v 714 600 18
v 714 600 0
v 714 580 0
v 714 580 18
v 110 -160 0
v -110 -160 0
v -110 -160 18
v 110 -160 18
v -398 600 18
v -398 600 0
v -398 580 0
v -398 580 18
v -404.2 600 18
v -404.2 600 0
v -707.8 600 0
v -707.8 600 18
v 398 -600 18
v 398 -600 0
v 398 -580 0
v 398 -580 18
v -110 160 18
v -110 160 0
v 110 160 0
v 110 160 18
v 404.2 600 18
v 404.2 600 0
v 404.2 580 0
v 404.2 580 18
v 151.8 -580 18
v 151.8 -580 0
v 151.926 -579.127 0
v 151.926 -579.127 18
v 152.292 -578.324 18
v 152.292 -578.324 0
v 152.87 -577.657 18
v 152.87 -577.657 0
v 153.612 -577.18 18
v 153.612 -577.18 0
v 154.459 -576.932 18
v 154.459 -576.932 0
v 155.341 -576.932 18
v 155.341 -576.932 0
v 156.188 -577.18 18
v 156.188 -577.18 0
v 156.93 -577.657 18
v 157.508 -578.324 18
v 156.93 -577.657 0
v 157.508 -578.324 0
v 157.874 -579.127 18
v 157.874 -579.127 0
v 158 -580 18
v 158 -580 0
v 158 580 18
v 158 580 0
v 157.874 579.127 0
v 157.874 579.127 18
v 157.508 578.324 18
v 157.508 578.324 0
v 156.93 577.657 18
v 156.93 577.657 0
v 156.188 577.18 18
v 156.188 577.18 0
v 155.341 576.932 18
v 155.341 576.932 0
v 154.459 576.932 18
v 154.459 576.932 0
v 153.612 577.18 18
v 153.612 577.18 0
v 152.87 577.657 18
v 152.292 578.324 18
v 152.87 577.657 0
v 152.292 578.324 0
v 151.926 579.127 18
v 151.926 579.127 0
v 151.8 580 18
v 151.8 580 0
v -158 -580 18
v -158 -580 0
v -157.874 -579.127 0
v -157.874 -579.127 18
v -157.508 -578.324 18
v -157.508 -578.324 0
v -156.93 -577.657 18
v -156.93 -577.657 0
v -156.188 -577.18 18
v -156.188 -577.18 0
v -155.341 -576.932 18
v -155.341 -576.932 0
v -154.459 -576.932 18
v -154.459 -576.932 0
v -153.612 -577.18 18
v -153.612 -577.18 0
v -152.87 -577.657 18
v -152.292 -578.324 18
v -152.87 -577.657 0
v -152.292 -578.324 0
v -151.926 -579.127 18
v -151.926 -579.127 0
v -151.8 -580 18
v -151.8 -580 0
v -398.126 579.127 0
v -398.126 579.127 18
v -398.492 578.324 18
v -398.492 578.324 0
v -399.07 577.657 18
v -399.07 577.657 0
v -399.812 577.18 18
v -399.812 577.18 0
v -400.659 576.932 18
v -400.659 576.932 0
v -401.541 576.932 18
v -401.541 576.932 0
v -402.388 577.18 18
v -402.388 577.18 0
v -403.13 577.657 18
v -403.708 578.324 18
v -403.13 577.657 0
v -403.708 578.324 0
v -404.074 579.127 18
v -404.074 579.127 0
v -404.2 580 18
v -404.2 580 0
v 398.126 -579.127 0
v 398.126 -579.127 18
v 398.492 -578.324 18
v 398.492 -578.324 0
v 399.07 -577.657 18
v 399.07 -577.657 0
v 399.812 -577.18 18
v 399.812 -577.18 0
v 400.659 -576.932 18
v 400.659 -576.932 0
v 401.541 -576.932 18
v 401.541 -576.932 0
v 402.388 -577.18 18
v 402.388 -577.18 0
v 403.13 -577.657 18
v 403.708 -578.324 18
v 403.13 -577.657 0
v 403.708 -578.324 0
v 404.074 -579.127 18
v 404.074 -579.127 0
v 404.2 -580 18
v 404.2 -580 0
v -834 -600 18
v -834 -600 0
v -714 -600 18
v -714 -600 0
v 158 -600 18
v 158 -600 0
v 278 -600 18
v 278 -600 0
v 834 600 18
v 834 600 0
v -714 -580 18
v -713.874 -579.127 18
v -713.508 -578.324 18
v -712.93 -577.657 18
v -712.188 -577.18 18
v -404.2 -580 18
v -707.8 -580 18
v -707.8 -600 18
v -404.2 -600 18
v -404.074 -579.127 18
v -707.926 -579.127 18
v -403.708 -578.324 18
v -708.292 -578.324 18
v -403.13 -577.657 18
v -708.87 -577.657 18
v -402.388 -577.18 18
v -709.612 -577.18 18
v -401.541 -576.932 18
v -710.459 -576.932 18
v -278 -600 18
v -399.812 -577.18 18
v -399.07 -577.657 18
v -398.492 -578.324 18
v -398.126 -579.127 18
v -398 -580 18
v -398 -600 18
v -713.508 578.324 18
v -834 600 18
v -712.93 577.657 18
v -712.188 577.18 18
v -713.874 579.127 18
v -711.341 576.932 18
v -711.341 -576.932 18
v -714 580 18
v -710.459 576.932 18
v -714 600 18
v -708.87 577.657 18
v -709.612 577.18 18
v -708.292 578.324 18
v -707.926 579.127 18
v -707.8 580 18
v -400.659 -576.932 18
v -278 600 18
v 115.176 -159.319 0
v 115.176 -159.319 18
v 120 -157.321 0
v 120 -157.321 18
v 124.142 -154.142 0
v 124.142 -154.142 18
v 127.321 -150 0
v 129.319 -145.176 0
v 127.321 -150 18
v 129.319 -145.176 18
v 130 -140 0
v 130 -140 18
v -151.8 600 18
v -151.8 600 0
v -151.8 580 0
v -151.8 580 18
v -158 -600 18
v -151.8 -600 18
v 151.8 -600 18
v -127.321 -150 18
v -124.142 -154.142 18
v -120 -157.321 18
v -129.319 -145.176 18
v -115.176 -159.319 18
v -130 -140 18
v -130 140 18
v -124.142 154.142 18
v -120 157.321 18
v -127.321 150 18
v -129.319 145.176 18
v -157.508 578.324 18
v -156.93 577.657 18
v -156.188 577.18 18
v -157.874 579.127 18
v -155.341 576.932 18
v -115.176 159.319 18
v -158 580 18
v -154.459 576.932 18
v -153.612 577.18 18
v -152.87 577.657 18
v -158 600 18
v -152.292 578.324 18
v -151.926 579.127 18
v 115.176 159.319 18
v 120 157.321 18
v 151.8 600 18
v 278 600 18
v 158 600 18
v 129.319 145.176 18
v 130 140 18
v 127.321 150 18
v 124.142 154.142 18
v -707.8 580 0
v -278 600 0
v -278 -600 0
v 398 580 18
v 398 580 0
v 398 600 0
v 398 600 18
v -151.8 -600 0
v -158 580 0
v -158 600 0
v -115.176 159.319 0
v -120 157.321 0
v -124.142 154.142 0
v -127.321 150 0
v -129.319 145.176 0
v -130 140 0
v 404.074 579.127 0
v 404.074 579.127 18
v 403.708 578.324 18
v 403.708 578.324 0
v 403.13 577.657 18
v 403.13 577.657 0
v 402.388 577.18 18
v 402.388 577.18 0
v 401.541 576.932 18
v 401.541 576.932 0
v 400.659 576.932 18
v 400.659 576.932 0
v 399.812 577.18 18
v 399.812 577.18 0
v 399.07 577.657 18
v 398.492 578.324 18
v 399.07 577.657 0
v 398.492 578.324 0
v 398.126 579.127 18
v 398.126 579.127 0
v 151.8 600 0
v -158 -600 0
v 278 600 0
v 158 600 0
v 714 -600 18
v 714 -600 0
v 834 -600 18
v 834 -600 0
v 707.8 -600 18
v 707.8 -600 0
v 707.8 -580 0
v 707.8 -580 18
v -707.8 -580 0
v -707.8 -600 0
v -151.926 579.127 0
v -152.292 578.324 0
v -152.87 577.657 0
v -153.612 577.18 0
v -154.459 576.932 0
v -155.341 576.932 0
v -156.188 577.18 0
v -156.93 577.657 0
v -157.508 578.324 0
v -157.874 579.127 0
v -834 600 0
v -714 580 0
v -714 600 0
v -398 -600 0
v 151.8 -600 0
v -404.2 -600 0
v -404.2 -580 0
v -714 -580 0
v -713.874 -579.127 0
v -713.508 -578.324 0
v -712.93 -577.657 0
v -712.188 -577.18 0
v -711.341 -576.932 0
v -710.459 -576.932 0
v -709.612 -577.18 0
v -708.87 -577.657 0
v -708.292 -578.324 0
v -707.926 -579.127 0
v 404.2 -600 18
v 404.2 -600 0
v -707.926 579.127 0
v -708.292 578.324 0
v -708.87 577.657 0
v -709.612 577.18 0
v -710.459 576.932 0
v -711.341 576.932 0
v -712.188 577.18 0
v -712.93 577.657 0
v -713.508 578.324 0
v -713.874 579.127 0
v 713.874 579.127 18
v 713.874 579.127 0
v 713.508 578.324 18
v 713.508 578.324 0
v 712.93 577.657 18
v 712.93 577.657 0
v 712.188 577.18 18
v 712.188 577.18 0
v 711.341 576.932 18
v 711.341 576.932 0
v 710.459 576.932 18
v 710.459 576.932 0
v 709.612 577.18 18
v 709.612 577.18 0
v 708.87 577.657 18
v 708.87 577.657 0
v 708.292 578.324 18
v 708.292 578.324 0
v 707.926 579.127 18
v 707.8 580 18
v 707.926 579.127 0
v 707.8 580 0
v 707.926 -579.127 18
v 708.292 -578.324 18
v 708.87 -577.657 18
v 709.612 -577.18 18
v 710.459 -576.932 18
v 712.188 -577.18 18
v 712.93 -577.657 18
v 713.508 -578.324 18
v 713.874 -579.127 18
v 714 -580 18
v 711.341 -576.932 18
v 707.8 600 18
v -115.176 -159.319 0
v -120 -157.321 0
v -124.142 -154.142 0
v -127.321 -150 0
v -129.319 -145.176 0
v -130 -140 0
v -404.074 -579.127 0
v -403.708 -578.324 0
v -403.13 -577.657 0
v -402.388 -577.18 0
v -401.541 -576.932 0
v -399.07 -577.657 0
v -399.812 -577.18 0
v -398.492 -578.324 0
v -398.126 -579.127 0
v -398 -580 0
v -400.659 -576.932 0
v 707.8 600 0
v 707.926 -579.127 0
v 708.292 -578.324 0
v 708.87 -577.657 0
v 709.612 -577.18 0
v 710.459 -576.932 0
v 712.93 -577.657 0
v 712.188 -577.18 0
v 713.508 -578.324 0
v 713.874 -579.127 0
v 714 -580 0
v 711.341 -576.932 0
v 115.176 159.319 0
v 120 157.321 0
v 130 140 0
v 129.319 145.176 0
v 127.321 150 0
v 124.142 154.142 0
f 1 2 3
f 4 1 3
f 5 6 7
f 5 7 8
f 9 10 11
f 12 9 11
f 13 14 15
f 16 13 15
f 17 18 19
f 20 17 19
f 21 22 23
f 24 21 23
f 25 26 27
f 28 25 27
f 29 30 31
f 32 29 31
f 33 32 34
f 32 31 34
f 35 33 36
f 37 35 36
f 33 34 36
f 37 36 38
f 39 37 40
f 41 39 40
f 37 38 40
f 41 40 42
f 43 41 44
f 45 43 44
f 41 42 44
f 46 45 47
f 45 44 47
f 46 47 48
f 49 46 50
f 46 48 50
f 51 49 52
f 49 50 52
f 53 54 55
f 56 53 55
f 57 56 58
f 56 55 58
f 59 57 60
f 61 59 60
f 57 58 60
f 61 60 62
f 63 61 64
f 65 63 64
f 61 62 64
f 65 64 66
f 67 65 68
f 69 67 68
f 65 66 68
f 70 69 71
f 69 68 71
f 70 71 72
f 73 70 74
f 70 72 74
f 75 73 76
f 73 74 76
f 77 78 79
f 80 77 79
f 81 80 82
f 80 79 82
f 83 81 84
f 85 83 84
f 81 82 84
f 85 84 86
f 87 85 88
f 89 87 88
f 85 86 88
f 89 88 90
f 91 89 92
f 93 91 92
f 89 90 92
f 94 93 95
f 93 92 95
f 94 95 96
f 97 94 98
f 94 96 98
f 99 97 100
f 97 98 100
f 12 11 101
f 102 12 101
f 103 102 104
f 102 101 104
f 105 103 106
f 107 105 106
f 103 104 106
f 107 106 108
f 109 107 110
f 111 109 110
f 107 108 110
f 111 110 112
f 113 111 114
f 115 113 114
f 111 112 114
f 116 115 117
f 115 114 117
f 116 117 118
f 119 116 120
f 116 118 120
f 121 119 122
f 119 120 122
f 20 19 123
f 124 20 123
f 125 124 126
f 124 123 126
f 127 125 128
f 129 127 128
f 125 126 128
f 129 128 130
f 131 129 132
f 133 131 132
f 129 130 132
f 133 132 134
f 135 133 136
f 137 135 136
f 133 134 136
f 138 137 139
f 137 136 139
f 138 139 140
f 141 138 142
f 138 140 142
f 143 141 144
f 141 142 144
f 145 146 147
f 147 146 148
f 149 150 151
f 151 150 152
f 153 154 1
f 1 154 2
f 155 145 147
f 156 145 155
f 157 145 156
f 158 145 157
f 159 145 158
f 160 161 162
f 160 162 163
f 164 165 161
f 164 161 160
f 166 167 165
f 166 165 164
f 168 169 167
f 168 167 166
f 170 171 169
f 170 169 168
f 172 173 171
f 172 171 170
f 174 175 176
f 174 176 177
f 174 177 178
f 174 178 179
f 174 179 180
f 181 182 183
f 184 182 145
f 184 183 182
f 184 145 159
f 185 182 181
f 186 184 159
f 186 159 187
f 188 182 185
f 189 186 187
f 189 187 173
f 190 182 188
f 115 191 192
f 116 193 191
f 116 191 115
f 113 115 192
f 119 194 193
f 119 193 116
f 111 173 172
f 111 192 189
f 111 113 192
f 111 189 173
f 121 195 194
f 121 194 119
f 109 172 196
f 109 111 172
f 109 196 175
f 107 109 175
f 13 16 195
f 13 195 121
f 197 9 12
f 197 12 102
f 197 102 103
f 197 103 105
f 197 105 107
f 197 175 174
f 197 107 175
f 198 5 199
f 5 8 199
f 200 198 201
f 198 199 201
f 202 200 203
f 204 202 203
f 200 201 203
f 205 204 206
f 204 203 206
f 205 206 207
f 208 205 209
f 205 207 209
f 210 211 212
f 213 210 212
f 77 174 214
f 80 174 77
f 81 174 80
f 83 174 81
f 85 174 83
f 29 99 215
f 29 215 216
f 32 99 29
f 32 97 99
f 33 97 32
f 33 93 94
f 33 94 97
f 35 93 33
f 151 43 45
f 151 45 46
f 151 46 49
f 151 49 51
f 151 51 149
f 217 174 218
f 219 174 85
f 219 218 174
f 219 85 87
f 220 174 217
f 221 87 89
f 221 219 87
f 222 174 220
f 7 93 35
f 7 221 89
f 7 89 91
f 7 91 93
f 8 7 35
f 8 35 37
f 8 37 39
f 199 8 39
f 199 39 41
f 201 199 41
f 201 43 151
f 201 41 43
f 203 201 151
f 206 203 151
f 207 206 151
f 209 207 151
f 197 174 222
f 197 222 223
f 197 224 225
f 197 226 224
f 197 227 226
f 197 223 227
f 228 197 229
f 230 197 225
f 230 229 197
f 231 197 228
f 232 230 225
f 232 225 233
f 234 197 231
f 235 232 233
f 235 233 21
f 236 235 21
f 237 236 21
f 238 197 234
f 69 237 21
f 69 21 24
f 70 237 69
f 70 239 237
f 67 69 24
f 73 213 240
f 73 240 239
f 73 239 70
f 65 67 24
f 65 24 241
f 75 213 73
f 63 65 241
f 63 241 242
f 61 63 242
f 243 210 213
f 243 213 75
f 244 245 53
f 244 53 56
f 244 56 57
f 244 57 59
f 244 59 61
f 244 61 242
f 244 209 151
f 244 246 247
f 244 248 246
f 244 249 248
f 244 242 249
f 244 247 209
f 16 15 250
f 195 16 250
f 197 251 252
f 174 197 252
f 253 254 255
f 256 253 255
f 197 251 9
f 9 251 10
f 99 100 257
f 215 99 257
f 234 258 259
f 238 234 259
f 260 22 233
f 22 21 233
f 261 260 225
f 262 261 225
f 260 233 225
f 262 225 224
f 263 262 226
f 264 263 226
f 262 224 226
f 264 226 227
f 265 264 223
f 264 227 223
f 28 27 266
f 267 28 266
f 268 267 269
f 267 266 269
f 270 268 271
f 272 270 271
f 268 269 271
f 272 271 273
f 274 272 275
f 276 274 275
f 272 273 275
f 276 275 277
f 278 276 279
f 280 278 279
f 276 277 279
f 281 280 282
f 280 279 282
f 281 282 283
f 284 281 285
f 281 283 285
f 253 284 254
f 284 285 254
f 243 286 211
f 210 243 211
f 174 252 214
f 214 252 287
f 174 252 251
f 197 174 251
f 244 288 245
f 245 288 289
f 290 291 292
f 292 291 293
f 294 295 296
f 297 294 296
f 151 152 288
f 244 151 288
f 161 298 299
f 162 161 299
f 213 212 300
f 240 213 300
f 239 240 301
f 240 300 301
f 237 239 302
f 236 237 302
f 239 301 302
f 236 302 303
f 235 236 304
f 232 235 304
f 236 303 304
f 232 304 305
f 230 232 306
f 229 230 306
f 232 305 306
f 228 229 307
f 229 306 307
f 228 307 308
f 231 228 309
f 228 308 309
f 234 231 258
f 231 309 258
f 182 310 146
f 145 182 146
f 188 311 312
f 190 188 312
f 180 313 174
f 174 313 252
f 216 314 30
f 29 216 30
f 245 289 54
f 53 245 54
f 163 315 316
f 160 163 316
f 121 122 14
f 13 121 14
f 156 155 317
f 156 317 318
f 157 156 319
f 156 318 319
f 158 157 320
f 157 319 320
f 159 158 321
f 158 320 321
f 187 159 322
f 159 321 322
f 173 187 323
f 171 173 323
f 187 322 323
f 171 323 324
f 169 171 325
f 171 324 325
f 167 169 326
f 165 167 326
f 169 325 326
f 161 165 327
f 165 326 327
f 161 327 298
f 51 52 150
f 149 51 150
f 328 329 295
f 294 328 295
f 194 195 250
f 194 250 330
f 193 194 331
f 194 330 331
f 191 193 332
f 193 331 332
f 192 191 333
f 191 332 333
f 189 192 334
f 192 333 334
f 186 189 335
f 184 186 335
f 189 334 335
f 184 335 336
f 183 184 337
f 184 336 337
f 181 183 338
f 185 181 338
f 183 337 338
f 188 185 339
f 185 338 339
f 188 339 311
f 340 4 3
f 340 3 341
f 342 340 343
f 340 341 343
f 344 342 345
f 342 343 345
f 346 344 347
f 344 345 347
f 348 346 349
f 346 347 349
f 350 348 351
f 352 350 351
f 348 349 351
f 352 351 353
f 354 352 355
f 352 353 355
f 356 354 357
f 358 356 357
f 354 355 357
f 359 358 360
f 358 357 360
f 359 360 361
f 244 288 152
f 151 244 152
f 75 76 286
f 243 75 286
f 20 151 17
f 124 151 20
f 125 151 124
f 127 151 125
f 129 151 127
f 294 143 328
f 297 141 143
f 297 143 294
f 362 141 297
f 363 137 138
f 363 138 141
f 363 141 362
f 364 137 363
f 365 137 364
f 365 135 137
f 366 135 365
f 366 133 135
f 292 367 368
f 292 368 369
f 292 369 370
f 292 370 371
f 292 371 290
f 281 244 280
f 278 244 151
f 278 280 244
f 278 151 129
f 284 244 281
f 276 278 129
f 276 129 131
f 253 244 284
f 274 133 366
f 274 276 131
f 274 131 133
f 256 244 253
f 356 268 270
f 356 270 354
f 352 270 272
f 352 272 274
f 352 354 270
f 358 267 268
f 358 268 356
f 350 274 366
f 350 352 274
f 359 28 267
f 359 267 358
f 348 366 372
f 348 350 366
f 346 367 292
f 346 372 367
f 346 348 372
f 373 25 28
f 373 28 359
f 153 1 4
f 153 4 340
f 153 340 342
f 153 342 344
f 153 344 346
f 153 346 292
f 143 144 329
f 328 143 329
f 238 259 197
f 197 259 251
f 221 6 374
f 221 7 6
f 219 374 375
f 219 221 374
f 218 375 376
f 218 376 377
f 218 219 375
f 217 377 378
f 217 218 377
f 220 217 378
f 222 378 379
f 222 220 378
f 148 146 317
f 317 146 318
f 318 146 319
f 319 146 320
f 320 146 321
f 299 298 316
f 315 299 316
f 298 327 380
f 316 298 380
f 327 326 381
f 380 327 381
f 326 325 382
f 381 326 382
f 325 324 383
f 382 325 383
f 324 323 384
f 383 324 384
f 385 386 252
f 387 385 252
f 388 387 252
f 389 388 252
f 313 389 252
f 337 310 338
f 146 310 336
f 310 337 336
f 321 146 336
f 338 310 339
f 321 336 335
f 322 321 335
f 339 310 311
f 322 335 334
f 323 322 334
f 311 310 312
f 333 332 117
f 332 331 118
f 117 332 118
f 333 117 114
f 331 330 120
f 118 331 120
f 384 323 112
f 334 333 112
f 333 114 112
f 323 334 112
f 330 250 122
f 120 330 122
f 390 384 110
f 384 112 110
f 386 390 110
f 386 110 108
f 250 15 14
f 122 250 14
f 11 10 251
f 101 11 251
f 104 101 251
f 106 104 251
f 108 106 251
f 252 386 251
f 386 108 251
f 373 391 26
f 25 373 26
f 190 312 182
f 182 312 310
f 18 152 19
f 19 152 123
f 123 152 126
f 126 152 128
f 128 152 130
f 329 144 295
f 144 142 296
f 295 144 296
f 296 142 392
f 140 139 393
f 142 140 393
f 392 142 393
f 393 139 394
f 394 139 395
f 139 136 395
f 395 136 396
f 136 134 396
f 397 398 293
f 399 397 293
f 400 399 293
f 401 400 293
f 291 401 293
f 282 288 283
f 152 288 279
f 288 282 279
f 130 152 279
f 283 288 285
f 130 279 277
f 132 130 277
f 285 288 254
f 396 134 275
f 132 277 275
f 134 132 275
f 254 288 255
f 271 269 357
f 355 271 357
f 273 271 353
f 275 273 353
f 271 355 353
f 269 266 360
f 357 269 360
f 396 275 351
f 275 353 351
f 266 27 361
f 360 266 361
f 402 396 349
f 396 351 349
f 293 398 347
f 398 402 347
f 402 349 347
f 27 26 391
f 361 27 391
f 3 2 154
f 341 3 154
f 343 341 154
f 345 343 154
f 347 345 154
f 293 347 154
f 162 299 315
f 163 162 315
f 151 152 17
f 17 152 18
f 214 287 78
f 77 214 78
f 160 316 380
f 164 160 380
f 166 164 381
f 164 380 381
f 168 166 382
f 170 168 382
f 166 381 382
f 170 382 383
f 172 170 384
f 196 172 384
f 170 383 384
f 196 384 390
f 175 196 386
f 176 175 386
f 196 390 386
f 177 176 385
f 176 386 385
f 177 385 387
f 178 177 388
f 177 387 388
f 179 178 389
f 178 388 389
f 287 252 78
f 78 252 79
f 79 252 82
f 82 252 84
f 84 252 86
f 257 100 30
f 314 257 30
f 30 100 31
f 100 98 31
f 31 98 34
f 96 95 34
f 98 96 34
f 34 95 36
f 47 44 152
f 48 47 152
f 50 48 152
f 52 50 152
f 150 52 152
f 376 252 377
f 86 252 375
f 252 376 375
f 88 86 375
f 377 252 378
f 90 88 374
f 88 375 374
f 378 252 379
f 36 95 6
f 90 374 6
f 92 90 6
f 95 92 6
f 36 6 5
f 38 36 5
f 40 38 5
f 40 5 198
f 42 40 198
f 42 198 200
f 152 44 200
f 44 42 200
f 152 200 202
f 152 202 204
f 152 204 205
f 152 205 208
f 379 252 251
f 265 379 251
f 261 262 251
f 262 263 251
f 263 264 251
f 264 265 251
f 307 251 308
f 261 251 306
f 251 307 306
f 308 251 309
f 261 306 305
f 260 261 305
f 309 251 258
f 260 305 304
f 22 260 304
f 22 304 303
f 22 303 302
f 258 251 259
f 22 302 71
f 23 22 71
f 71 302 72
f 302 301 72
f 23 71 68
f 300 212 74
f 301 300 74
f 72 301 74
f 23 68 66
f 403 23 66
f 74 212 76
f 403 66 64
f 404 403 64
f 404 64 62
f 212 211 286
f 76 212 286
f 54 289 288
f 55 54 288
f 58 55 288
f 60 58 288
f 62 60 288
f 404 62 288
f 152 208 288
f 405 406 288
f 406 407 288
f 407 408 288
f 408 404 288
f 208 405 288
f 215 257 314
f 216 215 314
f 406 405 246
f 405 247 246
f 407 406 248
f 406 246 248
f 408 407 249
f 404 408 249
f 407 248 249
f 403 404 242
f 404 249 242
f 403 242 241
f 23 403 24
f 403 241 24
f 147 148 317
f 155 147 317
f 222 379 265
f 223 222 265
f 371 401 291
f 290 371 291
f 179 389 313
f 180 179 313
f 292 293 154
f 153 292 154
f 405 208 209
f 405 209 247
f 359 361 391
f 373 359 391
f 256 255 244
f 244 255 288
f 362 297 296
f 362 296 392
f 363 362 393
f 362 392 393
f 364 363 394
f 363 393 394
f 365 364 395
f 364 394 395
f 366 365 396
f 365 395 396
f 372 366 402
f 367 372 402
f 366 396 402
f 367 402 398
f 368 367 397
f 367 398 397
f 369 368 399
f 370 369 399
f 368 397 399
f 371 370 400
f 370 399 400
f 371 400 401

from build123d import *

# Parameters (mm, degrees)
F0_W     = 260
F0_H     = 320
F1_DEPTH = 18
F2_DEPTH = 18
F3_DEPTH = 18
F4_R     = 20


with BuildPart() as f1:
    # F0 (on Top) → F1 (new body)
    with BuildSketch(Plane.XY):
        with BuildLine():
            Line((278, -600), (278, 600))
            Line((278, 600), (158, 600))
            Line((158, 600), (158, 580))
            ThreePointArc((158, 580), (154.9, 576.9), (151.8, 580))
            Line((151.8, 580), (151.8, 600))
            Line((151.8, 600), (-151.8, 600))
            Line((-151.8, 600), (-151.8, 580))
            ThreePointArc((-151.8, 580), (-154.9, 576.9), (-158, 580))
            Line((-158, 580), (-158, 600))
            Line((-158, 600), (-278, 600))
            Line((-278, 600), (-278, -600))
            Line((-278, -600), (-158, -600))
            Line((-158, -600), (-158, -580))
            ThreePointArc((-158, -580), (-154.9, -576.9), (-151.8, -580))
            Line((-151.8, -580), (-151.8, -600))
            Line((-151.8, -600), (151.8, -600))
            Line((151.8, -600), (151.8, -580))
            ThreePointArc((151.8, -580), (154.9, -576.9), (158, -580))
            Line((158, -580), (158, -600))
            Line((158, -600), (278, -600))
        make_face()
        Rectangle(F0_W, F0_H, mode=Mode.SUBTRACT)
    extrude(amount=F1_DEPTH)

    # F4
    f4_edges = [f1.edges().sort_by_distance(p)[0] for p in [
        (-130, 160, 9),
        (130, 160, 9),
        (-130, -160, 9),
        (130, -160, 9),
    ]]
    fillet(f4_edges, radius=F4_R)


with BuildPart() as f2:
    # F0 (on Top) → F2 (new body, through all)
    with BuildSketch(Plane.XY):
        with BuildLine():
            Line((-278, -600), (-278, 600))
            Line((-278, 600), (-398, 600))
            Line((-398, 600), (-398, 580))
            ThreePointArc((-398, 580), (-401.1, 576.9), (-404.2, 580))
            Line((-404.2, 580), (-404.2, 600))
            Line((-404.2, 600), (-707.8, 600))
            Line((-707.8, 600), (-707.8, 580))
            ThreePointArc((-707.8, 580), (-710.9, 576.9), (-714, 580))
            Line((-714, 580), (-714, 600))
            Line((-714, 600), (-834, 600))
            Line((-834, 600), (-834, -600))
            Line((-834, -600), (-714, -600))
            Line((-714, -600), (-714, -580))
            ThreePointArc((-714, -580), (-710.9, -576.9), (-707.8, -580))
            Line((-707.8, -580), (-707.8, -600))
            Line((-707.8, -600), (-404.2, -600))
            Line((-404.2, -600), (-404.2, -580))
            ThreePointArc((-404.2, -580), (-401.1, -576.9), (-398, -580))
            Line((-398, -580), (-398, -600))
            Line((-398, -600), (-278, -600))
        make_face()
    extrude(amount=F2_DEPTH)


with BuildPart() as f3:
    # F0 (on Top) → F3 (new body, through all)
    with BuildSketch(Plane.XY):
        with BuildLine():
            Line((834, -600), (834, 600))
            Line((834, 600), (714, 600))
            Line((714, 600), (714, 580))
            ThreePointArc((714, 580), (710.9, 576.9), (707.8, 580))
            Line((707.8, 580), (707.8, 600))
            Line((707.8, 600), (404.2, 600))
            Line((404.2, 600), (404.2, 580))
            ThreePointArc((404.2, 580), (401.1, 576.9), (398, 580))
            Line((398, 580), (398, 600))
            Line((398, 600), (278, 600))
            Line((278, 600), (278, -600))
            Line((278, -600), (398, -600))
            Line((398, -600), (398, -580))
            ThreePointArc((398, -580), (401.1, -576.9), (404.2, -580))
            Line((404.2, -580), (404.2, -600))
            Line((404.2, -600), (707.8, -600))
            Line((707.8, -600), (707.8, -580))
            ThreePointArc((707.8, -580), (710.9, -576.9), (714, -580))
            Line((714, -580), (714, -600))
            Line((714, -600), (834, -600))
        make_face()
    extrude(amount=F3_DEPTH)


solid = Compound([f1.part, f2.part, f3.part])
